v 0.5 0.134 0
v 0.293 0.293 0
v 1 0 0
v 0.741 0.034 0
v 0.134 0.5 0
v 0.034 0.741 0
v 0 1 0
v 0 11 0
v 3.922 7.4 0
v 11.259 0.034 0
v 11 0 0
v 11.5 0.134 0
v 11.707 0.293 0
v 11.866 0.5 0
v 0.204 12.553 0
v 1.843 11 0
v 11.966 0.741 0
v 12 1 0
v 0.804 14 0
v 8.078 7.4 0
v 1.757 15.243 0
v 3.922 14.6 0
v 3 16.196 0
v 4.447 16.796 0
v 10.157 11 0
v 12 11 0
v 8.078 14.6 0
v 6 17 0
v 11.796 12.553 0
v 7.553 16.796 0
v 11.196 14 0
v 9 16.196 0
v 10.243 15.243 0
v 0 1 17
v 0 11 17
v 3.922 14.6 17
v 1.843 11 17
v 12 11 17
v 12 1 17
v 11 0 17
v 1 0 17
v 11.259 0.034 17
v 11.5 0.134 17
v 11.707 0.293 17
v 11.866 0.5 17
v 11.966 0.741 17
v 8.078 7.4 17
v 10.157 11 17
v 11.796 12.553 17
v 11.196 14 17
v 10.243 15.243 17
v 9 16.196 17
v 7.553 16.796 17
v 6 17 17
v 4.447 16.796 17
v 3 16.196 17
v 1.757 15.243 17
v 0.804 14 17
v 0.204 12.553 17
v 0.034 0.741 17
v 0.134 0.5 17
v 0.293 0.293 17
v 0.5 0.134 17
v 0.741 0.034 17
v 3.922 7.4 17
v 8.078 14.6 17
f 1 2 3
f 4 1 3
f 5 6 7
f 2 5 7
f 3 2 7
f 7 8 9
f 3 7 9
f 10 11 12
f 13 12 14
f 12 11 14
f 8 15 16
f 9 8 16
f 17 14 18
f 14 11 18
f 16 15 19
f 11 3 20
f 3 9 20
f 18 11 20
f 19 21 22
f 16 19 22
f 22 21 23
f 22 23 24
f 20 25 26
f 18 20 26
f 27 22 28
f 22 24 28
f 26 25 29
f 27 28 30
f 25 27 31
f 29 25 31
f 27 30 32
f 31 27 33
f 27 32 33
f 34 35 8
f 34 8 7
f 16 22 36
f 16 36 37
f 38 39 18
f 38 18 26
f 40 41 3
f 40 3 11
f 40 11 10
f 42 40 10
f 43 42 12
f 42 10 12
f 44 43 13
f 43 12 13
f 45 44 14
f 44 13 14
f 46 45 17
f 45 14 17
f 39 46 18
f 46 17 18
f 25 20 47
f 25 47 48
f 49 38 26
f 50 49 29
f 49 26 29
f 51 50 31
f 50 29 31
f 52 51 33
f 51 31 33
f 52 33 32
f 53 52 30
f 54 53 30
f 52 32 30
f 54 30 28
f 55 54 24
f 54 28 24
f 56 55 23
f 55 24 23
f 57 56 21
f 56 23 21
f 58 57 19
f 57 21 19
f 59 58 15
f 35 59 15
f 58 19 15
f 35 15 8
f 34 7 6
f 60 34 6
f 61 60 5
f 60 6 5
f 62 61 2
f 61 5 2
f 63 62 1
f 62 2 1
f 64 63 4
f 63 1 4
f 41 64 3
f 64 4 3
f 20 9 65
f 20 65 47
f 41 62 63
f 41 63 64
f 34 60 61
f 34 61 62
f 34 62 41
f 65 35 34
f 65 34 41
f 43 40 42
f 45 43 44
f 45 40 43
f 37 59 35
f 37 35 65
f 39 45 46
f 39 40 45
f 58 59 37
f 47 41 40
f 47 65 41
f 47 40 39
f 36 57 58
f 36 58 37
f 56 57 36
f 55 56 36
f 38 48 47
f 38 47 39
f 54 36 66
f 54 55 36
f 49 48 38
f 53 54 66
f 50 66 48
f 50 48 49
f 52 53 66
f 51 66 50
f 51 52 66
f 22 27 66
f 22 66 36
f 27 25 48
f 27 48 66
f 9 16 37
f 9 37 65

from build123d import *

# Parameters (mm, degrees)
BOSS_EXTRUDE1_DEPTH = 17


with BuildPart() as part:
    # Sketch1 → Boss-Extrude1 (new body)
    with BuildSketch(Plane.XY):
        with BuildLine():
            Line((1, 0), (11, 0))
            ThreePointArc((11, 0), (11.707106781, 0.292893219), (12, 1))
            Line((12, 1), (12, 11))
            ThreePointArc((12, 11), (6, 17), (0, 11))
            Line((0, 11), (0, 1))
            ThreePointArc((0, 1), (0.292893219, 0.292893219), (1, 0))
        make_face()
        Polygon((10.156921938, 11), (8.078460969, 14.6), (3.921539031, 14.6), (1.843078062, 11), (3.921539031, 7.4), (8.078460969, 7.4), align=None, mode=Mode.SUBTRACT)
    extrude(amount=BOSS_EXTRUDE1_DEPTH)


solid = part.part
